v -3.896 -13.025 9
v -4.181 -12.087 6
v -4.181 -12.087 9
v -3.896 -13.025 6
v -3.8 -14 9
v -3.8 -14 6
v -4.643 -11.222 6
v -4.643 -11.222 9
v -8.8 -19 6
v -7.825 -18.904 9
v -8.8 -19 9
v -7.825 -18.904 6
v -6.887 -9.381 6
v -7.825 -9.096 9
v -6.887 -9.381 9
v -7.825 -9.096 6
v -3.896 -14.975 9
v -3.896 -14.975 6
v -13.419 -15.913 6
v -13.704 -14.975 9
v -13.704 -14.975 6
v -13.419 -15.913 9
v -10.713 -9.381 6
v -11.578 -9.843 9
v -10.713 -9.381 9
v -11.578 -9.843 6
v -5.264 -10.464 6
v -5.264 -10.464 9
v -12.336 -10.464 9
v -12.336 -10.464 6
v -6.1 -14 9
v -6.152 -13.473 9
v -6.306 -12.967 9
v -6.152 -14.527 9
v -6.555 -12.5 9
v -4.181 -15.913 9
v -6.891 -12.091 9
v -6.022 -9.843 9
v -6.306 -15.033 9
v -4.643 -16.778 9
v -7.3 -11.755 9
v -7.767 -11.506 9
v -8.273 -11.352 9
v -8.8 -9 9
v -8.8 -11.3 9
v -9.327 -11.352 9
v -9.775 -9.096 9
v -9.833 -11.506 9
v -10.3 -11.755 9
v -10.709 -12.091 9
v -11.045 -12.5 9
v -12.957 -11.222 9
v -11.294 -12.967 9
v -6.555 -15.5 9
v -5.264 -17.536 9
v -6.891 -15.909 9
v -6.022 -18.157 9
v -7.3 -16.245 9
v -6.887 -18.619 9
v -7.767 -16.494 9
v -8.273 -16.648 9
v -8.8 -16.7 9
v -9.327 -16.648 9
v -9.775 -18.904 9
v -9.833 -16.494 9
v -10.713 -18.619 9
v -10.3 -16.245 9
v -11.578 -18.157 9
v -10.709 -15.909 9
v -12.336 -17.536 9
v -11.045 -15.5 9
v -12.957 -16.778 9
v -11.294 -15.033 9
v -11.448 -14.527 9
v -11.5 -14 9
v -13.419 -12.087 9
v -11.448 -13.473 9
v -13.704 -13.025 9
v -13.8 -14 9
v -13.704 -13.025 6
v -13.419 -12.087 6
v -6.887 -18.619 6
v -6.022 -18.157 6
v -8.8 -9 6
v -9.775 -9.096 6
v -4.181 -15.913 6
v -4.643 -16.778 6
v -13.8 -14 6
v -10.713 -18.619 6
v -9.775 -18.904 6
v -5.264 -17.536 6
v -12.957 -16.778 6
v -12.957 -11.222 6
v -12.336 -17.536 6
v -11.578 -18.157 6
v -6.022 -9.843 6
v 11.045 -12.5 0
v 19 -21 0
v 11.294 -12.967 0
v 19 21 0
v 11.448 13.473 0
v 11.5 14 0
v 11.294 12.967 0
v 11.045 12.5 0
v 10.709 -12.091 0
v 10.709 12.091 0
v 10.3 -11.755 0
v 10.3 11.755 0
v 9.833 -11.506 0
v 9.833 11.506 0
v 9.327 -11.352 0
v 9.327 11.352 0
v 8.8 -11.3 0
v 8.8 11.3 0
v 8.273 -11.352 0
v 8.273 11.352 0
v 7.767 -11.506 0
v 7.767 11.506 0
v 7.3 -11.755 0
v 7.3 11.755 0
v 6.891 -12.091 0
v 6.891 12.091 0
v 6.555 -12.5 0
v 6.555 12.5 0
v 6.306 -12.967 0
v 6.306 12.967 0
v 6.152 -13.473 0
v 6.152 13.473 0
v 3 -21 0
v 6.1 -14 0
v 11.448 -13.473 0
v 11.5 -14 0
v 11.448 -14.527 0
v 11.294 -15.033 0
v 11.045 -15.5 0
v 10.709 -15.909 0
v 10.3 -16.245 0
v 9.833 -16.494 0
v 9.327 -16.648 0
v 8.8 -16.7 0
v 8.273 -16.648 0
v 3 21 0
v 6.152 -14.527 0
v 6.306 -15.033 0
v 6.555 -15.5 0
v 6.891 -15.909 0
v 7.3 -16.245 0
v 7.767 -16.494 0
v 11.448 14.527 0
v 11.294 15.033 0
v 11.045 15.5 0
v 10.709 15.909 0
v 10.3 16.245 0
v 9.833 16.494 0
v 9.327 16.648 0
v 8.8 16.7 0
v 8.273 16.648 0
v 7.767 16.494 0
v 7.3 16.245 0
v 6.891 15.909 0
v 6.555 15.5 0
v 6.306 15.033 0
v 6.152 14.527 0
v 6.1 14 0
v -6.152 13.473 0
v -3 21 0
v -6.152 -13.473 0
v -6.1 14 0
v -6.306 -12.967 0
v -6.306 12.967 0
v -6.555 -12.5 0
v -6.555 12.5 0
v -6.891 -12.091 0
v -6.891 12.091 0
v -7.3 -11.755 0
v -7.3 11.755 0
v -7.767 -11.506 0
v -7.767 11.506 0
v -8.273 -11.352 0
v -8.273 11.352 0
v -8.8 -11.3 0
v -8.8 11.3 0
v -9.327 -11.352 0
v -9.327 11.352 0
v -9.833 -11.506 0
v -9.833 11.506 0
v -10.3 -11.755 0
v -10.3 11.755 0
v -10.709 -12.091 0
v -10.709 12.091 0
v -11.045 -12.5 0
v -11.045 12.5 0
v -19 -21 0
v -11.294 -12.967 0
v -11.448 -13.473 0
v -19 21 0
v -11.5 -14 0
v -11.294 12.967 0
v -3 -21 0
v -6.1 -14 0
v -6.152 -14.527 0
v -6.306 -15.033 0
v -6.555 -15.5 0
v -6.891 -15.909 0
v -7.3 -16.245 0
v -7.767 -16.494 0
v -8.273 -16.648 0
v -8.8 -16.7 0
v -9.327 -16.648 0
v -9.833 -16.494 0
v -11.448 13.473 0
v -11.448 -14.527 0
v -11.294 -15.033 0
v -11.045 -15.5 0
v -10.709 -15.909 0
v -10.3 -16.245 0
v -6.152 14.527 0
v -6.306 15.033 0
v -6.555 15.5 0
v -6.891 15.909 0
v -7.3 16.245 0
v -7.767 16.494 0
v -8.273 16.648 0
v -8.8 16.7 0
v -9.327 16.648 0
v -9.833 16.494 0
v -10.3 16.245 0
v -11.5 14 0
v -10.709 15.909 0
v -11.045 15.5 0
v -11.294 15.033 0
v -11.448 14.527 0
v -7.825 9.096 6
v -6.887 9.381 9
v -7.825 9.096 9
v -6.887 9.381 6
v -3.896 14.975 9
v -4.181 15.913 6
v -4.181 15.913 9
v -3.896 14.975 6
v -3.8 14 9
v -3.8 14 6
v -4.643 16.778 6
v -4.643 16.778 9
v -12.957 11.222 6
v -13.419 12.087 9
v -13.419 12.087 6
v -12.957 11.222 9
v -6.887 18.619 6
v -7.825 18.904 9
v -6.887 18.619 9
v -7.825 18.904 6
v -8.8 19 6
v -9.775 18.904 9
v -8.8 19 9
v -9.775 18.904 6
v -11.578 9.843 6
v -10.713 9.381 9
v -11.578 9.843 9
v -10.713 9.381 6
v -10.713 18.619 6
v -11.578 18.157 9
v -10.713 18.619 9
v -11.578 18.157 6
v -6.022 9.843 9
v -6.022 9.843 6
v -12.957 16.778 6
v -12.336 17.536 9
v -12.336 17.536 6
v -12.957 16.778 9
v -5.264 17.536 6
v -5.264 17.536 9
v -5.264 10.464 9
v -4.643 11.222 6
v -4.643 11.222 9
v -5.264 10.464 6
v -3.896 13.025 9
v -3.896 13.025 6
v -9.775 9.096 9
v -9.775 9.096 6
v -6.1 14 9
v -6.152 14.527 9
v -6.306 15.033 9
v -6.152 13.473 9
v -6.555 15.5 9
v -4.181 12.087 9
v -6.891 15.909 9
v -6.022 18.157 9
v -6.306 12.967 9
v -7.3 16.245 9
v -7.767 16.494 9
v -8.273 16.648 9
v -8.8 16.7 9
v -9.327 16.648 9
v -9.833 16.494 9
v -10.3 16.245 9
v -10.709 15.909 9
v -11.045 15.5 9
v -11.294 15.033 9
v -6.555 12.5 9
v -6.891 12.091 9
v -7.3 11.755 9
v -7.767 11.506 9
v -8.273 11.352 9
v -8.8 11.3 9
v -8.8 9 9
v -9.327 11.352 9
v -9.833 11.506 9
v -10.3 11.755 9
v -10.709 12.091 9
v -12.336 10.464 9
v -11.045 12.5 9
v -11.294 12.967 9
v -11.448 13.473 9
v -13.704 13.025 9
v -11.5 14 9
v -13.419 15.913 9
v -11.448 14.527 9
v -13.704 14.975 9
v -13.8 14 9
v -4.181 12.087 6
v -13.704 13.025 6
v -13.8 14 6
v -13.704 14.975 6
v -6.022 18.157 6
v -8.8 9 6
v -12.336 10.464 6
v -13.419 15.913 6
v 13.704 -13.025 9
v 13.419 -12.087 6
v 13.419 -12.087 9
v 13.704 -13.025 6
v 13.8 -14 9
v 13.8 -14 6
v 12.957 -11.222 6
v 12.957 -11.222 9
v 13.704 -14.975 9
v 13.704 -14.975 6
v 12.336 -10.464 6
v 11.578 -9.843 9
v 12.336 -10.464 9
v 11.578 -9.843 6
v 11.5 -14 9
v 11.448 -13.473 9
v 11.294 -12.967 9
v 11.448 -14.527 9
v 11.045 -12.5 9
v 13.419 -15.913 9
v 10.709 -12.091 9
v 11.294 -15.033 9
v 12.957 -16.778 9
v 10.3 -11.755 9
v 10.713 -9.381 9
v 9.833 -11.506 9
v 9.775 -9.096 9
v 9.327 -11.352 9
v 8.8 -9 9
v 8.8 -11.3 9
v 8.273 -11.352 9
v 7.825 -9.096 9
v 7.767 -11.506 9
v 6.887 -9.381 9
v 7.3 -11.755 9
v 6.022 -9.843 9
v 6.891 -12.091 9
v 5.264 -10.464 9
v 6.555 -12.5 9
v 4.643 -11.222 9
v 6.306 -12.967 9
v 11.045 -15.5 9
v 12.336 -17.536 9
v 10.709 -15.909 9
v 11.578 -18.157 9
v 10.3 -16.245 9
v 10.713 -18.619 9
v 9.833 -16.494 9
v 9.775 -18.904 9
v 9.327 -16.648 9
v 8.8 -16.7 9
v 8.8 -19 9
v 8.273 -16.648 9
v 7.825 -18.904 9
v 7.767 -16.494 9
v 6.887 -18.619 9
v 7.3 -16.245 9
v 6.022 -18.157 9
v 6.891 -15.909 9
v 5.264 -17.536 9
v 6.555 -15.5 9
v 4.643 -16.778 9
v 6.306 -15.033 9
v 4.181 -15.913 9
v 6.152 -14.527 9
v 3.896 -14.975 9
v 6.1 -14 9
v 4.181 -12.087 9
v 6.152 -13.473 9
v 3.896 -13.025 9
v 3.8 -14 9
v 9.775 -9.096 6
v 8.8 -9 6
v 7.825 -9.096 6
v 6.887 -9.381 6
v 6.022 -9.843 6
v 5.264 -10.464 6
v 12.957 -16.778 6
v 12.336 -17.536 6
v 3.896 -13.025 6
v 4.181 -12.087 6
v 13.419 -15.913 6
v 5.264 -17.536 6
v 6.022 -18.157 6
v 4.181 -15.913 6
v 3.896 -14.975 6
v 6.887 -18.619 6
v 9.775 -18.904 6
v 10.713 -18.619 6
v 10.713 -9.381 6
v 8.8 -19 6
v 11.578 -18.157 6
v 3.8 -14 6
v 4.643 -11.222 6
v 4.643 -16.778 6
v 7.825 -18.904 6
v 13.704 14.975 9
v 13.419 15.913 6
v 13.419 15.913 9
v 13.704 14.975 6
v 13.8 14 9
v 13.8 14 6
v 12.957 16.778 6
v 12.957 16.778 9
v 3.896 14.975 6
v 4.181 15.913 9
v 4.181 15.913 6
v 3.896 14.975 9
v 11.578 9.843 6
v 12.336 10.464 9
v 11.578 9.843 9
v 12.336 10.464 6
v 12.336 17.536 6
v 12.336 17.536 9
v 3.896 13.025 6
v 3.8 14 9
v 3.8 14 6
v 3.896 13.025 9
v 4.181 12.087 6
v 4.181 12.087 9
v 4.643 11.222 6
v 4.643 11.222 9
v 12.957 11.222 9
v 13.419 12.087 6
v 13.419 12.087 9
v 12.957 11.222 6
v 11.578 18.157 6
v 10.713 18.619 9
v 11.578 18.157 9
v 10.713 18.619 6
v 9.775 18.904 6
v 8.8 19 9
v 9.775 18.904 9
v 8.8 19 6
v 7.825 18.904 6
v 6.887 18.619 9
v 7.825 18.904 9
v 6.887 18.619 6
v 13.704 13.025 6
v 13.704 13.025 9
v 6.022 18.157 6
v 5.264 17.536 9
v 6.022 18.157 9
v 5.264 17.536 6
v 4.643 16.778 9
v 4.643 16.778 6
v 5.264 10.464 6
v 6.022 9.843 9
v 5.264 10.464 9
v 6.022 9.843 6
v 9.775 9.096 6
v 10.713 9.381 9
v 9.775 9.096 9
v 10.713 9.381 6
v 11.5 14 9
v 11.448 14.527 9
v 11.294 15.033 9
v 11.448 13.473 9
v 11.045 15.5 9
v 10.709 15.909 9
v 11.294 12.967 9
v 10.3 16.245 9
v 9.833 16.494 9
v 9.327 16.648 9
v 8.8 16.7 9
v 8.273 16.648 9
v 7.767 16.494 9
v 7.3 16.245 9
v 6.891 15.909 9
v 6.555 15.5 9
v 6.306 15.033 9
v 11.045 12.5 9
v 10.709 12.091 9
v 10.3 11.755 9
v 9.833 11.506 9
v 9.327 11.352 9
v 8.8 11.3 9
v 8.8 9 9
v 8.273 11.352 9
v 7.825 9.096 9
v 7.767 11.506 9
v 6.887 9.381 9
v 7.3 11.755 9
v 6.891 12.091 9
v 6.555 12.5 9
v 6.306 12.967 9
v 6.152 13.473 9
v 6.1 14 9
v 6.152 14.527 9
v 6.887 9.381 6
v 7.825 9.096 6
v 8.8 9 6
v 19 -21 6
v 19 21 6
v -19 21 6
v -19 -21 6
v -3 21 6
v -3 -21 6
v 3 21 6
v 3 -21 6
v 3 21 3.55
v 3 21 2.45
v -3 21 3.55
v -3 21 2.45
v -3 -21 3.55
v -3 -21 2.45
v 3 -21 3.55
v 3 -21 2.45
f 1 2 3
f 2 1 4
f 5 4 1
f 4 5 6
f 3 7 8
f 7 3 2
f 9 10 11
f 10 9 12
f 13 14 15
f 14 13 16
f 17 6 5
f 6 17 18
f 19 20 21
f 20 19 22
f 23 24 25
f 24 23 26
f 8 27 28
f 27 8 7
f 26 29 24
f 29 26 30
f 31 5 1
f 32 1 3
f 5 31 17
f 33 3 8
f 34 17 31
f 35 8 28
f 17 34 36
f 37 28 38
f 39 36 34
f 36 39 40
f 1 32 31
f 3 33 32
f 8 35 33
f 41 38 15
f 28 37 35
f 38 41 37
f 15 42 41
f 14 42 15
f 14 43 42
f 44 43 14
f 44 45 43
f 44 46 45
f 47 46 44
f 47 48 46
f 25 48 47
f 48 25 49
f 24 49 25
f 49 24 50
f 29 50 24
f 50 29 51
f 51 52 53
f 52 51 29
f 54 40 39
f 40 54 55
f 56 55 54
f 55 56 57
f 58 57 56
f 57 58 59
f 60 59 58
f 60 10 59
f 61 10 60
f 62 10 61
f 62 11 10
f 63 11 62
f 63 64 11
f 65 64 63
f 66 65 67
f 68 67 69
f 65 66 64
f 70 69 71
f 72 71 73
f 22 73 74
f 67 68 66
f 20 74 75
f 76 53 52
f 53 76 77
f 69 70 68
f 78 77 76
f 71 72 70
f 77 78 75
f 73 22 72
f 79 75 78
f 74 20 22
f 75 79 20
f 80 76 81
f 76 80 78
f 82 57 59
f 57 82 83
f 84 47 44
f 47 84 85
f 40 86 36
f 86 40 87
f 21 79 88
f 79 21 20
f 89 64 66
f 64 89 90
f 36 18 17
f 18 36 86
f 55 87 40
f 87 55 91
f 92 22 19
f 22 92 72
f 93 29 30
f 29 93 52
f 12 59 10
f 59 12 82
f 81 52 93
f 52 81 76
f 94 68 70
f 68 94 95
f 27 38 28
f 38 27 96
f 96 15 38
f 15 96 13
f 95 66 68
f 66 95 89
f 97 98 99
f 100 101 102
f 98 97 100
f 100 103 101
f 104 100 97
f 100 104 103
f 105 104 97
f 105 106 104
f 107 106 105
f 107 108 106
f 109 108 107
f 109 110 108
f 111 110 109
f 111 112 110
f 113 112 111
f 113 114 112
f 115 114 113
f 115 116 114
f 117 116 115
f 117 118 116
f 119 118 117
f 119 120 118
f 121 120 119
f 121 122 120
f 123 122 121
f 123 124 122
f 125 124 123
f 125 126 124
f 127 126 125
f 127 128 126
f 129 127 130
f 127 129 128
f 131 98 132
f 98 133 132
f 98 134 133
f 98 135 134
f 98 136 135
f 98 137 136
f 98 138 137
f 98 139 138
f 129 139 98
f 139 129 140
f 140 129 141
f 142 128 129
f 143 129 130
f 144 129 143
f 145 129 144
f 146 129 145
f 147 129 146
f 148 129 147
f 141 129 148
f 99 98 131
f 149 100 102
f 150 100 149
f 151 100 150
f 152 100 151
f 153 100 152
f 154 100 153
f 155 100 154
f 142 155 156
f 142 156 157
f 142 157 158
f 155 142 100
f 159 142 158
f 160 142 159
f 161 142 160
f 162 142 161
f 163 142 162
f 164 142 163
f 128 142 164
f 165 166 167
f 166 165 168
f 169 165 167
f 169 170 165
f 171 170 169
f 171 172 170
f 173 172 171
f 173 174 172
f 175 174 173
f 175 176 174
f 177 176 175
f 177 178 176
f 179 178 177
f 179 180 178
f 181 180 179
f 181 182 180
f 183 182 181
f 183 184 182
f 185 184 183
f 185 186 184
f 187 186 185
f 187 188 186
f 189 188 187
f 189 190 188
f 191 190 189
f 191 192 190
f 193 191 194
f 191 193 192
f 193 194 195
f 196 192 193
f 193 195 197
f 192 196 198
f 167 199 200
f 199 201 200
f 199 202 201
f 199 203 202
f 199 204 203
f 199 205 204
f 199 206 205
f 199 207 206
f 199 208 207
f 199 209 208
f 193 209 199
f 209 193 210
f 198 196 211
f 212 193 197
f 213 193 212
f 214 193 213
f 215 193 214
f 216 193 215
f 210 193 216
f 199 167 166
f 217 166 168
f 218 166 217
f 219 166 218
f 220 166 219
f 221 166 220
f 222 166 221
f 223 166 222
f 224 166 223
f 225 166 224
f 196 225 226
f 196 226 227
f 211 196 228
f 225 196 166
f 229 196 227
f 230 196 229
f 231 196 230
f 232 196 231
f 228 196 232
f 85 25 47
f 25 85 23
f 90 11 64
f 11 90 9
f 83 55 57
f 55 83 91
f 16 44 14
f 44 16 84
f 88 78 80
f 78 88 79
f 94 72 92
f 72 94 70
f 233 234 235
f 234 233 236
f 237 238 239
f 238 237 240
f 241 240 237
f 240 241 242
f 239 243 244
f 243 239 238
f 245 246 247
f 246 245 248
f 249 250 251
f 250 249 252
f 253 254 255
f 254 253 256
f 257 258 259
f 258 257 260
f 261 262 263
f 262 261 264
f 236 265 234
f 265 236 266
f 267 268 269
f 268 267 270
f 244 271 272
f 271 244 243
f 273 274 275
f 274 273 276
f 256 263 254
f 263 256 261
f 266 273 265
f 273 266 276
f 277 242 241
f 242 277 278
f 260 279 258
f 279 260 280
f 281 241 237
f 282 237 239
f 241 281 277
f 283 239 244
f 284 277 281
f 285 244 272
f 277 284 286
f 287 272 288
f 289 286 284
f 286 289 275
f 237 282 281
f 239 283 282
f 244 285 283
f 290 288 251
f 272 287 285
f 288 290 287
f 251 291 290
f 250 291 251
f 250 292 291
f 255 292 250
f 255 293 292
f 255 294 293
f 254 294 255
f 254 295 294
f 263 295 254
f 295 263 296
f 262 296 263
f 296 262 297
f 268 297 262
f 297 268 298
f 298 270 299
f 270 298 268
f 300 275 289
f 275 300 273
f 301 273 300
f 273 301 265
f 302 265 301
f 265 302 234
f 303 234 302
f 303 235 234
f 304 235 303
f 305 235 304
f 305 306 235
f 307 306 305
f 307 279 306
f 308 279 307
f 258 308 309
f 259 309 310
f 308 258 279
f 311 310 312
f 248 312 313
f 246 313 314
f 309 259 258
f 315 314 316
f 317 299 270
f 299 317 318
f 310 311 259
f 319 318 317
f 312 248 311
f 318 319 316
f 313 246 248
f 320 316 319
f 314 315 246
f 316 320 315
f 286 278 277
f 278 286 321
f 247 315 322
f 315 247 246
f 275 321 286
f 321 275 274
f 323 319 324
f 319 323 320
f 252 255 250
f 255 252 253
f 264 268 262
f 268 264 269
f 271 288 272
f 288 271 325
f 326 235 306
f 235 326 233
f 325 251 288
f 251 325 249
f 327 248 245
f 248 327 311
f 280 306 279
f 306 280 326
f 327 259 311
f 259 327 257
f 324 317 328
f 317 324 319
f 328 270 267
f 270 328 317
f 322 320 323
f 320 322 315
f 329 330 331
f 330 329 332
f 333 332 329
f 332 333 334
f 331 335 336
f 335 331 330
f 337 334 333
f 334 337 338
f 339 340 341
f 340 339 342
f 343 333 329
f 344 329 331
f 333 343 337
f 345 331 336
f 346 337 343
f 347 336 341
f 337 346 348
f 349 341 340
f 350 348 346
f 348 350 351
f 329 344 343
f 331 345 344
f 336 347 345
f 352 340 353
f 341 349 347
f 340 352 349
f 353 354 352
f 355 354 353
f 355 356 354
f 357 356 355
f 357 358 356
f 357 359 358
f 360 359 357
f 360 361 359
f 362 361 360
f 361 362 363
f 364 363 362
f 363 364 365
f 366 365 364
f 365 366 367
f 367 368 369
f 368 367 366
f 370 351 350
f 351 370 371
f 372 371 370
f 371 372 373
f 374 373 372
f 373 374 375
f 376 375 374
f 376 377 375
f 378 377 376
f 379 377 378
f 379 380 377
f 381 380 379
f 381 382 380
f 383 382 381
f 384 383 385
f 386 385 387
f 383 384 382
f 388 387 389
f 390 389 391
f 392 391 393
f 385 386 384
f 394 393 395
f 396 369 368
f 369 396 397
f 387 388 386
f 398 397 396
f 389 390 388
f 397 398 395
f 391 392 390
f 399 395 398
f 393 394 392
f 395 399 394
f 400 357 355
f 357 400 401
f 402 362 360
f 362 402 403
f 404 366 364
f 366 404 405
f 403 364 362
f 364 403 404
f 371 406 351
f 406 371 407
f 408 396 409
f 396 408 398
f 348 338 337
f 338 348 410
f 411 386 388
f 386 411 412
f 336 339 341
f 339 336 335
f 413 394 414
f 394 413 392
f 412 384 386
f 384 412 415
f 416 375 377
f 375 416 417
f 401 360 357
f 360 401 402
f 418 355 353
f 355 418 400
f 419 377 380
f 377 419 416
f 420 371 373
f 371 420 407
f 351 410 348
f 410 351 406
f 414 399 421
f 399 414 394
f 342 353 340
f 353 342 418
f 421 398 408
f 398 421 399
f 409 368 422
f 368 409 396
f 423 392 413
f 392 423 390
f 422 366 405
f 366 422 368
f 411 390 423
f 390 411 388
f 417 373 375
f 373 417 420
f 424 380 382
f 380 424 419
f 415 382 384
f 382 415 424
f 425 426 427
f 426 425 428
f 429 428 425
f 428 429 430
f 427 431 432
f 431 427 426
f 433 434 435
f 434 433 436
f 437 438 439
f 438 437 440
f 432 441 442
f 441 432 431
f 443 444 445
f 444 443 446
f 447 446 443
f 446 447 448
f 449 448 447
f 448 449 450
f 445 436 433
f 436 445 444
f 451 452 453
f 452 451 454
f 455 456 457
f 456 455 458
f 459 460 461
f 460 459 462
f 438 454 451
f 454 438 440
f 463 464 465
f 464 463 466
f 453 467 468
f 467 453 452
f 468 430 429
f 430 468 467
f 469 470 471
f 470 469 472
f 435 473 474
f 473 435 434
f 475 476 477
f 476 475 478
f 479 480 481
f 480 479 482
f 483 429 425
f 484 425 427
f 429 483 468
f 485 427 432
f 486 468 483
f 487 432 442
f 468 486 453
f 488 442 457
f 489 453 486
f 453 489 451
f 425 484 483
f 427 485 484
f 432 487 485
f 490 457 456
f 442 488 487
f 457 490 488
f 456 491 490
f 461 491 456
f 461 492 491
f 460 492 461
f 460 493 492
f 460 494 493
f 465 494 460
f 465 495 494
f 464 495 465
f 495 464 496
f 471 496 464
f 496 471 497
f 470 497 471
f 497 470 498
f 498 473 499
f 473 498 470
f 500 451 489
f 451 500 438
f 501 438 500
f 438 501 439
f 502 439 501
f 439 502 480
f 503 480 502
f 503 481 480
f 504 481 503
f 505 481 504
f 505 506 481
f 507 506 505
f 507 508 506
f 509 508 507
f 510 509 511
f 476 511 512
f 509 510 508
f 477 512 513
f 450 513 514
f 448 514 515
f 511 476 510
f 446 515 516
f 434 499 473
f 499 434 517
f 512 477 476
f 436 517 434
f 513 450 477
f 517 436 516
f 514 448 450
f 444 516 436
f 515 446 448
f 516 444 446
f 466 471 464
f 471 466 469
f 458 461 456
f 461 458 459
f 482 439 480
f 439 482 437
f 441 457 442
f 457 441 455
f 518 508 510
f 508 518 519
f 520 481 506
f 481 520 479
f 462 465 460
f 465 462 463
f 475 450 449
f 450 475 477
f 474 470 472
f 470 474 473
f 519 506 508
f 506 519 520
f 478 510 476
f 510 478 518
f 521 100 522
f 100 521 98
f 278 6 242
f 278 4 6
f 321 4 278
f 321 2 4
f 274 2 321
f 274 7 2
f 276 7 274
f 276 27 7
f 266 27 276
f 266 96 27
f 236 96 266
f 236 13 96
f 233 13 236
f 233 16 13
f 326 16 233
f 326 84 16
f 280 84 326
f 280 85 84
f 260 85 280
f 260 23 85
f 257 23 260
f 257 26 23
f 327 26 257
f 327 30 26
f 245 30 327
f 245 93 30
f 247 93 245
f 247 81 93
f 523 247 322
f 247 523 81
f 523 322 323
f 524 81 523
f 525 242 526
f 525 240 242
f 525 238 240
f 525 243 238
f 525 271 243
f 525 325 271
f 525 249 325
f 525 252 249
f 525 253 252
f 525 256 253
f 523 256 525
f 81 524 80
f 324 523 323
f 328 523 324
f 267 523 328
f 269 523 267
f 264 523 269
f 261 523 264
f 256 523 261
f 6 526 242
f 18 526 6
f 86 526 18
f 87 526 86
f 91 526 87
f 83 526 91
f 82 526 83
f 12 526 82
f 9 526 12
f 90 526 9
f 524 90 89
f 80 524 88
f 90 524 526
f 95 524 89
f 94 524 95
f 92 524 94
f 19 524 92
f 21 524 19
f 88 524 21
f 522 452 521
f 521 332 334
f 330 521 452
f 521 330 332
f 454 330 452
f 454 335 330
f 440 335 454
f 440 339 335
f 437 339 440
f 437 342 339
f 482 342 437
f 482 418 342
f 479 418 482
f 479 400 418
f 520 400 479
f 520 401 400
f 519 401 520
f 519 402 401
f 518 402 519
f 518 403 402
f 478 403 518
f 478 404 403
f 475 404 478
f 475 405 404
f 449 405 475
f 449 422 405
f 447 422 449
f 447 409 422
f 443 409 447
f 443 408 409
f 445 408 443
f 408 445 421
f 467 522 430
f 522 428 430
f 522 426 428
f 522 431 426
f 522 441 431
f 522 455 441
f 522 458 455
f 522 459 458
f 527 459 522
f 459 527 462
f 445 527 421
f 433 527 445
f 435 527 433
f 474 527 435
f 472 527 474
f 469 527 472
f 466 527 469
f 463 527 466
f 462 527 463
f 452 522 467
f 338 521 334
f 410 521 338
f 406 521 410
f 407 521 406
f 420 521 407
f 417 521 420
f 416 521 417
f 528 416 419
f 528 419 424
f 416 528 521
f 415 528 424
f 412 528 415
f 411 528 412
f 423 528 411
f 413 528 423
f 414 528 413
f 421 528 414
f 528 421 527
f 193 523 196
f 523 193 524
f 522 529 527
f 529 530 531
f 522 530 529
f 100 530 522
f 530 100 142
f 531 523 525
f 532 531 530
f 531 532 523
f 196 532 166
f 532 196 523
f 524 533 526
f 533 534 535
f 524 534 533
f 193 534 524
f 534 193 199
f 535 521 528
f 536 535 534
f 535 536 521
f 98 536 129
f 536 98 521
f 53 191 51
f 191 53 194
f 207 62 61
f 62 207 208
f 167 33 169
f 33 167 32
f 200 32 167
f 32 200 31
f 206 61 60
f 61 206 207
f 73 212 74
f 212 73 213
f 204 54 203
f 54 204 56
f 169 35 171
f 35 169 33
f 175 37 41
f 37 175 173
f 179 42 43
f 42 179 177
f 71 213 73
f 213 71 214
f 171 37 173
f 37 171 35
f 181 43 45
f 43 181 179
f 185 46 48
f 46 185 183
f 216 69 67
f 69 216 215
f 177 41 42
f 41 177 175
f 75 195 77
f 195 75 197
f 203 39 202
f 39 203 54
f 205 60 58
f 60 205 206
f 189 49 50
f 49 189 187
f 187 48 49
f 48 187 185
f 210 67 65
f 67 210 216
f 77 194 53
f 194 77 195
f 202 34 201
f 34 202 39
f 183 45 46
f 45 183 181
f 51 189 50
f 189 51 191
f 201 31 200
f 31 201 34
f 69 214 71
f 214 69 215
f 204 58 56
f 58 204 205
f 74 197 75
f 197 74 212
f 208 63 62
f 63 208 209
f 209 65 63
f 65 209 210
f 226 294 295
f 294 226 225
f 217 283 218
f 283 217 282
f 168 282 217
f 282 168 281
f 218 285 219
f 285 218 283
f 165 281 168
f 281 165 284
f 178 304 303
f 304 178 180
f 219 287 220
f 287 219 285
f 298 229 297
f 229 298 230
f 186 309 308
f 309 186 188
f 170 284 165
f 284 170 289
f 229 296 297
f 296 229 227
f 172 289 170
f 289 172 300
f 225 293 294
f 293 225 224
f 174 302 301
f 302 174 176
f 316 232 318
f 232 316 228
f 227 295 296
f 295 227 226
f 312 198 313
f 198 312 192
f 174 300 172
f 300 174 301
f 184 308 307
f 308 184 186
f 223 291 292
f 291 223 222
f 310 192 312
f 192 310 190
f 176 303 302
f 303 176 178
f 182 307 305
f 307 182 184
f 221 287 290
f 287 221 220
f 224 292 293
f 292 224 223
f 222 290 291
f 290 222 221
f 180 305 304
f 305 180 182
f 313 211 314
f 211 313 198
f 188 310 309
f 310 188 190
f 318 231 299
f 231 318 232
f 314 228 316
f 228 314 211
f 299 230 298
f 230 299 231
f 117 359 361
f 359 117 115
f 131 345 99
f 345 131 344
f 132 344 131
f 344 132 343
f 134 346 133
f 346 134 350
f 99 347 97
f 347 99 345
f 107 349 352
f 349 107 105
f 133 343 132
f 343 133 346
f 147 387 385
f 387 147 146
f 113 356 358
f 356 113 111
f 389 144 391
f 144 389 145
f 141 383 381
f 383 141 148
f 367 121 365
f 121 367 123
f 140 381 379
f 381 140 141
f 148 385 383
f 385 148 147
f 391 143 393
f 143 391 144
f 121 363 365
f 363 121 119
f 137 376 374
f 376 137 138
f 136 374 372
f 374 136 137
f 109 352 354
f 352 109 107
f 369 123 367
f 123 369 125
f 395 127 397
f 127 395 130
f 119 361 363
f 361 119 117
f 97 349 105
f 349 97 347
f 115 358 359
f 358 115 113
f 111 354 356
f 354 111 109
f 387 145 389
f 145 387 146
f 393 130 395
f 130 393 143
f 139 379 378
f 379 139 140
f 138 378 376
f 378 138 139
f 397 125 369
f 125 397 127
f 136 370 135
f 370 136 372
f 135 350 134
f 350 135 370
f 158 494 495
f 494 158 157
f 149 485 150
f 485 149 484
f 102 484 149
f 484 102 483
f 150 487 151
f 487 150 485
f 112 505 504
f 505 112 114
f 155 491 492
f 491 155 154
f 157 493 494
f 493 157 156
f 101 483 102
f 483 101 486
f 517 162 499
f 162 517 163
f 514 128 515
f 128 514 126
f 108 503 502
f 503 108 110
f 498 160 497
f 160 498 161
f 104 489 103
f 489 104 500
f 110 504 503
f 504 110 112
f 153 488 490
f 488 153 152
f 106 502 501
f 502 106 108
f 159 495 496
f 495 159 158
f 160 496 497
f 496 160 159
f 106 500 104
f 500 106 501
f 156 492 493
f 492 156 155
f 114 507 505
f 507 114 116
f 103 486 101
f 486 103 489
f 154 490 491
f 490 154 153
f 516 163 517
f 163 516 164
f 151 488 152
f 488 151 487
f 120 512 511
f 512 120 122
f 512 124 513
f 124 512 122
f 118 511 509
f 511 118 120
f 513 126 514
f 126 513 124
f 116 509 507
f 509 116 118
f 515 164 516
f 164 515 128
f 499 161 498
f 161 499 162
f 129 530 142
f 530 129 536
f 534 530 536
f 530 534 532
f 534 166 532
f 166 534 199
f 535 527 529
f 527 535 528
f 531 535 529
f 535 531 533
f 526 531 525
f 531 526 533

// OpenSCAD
$fn = 32;

// ----------------------------------------------------------------------
// Living hinge: 38 x 42 mm plates, 1.1 mm flexible web
// ----------------------------------------------------------------------

// --- parameters (mm) ---
plate_len = 16;           // plate length outside the web
plate_w = 42;             // plate width
thick = 6;                // plate thickness
web_half = 3;             // half width of the flex band
web_t = 1.1;              // flexible web thickness
web_z = 2.45;             // web position inside the thickness
boss_d = 10;              // screw boss diameter
boss_h = 9;               // screw boss height
boss_x = 8.8;             // screw boss distance from the web
screw_d = 5.4;            // screw hole

difference() {
  union() {
    /* one flat strip, later thinned at the middle */
    translate([-19, -21, 0]) cube([38, 42, 6]);
    /* screw bosses, sunk 0.5 mm into the plates */
    for (sx = [-8.8, 8.8]) {
      for (sy = [-14, 14]) {
        translate([sx, sy, 0]) cylinder(h = boss_h, d = boss_d);
      }
    }
  }
  /* channel from below: leaves the web on top of it */
  translate([-3, -23.5, -2.5]) cube([6, 47, 4.95]);
  /* channel from above: thins the web down to web_t */
  translate([-3, -23.5, 3.55]) cube([6, 47, 4.95]);
  /* screw holes through the bosses */
  for (sx = [-8.8, 8.8]) {
    for (sy = [-14, 14]) {
      translate([sx, sy, -2.5]) cylinder(h = boss_h + 5, d = screw_d);
    }
  }
}
